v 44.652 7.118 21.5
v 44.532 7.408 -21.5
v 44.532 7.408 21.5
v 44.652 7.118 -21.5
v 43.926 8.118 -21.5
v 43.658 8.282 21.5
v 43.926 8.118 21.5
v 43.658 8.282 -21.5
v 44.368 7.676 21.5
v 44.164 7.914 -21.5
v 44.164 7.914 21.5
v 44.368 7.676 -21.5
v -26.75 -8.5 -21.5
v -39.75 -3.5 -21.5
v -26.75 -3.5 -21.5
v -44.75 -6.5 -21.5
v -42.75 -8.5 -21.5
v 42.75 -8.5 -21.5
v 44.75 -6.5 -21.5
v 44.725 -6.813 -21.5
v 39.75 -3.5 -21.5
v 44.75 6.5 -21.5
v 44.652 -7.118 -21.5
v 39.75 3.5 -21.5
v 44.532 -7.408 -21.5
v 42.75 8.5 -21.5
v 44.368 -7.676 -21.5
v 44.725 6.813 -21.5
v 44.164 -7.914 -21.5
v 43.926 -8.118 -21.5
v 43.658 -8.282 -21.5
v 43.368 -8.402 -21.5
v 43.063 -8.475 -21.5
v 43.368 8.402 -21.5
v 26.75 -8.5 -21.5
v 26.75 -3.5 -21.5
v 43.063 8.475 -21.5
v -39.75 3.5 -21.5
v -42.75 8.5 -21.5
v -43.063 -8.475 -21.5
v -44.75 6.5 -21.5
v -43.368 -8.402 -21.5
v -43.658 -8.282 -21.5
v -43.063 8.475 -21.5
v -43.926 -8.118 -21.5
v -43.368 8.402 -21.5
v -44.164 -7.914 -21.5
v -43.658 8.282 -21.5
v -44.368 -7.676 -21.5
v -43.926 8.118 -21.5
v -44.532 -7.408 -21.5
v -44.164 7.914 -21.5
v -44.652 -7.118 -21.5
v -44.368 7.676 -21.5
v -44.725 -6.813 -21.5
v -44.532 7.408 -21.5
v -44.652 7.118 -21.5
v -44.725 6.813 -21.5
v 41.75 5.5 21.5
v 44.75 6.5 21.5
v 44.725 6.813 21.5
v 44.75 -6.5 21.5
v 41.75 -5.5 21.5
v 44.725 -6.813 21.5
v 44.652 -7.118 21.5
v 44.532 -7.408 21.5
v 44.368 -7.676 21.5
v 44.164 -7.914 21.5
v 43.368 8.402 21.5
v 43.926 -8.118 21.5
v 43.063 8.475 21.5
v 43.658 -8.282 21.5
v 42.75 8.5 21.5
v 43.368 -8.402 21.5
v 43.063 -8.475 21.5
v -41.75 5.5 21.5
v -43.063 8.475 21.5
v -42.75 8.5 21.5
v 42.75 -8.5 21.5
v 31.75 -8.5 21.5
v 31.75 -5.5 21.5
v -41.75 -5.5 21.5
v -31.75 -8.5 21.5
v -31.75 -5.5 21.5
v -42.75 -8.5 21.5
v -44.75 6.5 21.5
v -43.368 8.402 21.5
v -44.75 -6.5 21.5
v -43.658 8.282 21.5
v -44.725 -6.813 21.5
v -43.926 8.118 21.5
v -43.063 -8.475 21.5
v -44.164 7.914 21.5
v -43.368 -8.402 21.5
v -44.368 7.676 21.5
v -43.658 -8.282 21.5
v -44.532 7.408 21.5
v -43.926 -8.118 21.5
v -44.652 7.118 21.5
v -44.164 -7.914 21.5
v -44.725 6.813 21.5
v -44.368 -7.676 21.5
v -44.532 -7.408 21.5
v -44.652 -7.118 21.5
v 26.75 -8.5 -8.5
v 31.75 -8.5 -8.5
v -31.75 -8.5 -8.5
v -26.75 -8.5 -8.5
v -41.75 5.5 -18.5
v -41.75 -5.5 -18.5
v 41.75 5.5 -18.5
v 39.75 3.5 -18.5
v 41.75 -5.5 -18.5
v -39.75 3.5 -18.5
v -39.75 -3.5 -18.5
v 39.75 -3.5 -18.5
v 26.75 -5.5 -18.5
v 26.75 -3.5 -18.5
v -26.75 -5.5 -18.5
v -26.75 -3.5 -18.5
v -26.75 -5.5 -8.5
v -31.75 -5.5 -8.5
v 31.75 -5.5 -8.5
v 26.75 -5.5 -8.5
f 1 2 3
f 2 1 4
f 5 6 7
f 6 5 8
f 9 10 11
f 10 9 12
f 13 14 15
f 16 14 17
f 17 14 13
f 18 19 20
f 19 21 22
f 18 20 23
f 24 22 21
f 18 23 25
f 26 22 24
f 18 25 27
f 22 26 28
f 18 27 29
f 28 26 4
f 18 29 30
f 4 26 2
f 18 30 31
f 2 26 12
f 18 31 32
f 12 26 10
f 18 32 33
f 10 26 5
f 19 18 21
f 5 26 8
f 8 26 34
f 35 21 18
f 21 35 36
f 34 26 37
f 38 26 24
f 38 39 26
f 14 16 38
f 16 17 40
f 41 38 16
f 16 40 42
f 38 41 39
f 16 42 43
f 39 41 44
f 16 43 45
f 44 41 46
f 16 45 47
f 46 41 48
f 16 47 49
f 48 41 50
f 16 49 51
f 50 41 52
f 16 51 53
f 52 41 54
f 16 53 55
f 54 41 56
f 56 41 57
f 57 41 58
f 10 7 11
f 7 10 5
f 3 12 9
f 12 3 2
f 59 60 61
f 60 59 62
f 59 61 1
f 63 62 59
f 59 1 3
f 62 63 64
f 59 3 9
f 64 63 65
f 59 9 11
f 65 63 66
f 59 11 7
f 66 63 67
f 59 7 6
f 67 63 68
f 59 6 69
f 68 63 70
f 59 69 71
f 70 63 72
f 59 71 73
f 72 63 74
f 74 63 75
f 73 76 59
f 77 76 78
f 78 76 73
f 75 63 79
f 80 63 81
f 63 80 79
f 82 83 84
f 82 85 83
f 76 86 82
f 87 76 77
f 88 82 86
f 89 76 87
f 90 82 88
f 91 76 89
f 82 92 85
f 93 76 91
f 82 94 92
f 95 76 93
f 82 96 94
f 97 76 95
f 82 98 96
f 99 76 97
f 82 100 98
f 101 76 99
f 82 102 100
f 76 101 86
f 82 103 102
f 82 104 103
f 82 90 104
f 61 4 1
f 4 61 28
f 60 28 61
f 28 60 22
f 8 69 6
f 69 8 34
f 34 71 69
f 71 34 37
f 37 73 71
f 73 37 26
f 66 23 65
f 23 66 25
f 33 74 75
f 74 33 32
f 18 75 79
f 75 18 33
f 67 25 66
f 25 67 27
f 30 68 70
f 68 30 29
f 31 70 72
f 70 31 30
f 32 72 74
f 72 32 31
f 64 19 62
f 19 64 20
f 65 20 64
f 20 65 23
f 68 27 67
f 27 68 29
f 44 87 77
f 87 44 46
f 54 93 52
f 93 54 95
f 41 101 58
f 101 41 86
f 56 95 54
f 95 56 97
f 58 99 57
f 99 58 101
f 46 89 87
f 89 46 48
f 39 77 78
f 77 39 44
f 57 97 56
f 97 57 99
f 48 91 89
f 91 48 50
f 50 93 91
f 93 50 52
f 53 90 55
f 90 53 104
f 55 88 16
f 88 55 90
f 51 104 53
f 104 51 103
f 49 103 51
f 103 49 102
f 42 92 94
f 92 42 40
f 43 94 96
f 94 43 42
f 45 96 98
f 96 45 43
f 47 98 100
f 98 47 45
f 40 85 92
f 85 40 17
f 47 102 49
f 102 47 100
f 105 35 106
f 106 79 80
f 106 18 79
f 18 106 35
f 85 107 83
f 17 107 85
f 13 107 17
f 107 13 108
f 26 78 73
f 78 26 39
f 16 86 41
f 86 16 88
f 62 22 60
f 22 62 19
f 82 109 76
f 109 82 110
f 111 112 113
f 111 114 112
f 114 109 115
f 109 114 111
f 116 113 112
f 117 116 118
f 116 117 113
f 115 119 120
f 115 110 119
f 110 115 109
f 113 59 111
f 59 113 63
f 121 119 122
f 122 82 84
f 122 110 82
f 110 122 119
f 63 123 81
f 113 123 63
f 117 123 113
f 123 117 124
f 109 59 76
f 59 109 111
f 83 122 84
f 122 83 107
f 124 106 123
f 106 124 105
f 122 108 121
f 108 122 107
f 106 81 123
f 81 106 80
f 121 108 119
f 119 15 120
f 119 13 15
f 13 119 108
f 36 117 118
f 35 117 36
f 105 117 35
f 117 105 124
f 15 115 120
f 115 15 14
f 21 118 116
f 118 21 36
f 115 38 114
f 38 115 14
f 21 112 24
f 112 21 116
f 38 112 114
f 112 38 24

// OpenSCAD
echo(version=version());
/* 
Customizable Phone Holder
Created by: Zeakfury
Created date: 01/16/2017
*/

// Include Boxes library to get easy rounded boxes
include <MCAD/boxes.scad>  

//Viewer
rotate([0,0,180])
render()
Item_Holder();

//Setup Variables

/* [Item Dimensions] */
//- Item's Width (X-Axis)
pWidth = 83.5;

//- Item's Thickness (Y-Axis)
pThick = 11;

//- Mount/Holder Height (Z-Axis)
HHolder = 40;

//- Thickness of the walls for the Mount
WallThick = 3;// 

/* [Supports] */
//- Height of Horizontal Front Lip
HLip = 10;// 

//- Width of Vertical Front Lip
WLip = 20;// 

//- Front Hole on Lip (0=No 1=Yes)
FHole = 1;// [1:Yes,0:No]

//- Front Hole Lip Length
FWidth = 5;// 

/* [Bottom Hole] */
//- Bottom Hole for charger/speakers (0=No 1=Yes)
BHole = 1;// [1:Yes,0:No]

//- Width for Rim of Hole to Hold Item
BWidth = 2;

//- Thick for Rim of Hole to Hold Item
BThick = 2;




//Create Body
module Item_Holder() {
    //rotate([pTilt*-1,0,0]){
        difference(){
            //Main Shape
            union(){
                roundedBox([pWidth+WallThick*2,pThick+WallThick*2,HHolder+WallThick], 2, true, $fn=40);
                
            }
            //Remove Parts
            union(){
                //Phone Hole
                translate([0,0,WallThick]) 
                    color("green")
                cube([pWidth,pThick,HHolder+WallThick], true);
                //Lip Height
                translate([-(pWidth-WLip)/2,pThick/2,WallThick/2-(HHolder/2-HLip)]) 
                    color("blue")
                cube([pWidth-WLip,WallThick,HHolder-HLip], false);
                //Lip Hole
                if (FHole == 1 && BHole == 1 && BThick <= pThick){
                    translate([-(pWidth-FWidth*2-WLip)/2,(pThick/2-BThick),-(HHolder+WallThick)/2]) 
                        color("pink")
                    cube([pWidth-(FWidth*2)-WLip,WallThick+(BThick),HLip+WallThick],false);
                    }else if (FHole == 1 && (BHole == 0 || BThick > pThick)){
                    translate([-(pWidth-FWidth*2-WLip)/2,(pThick/2),-(HHolder+WallThick)/2]) 
                        color("pink")
                    cube([pWidth-(FWidth*2)-WLip,WallThick,HLip+WallThick],false);}                    
                //Bottom Hole
                if (BHole == 1 && BWidth < pWidth && BThick < pThick) {
                    translate([-(pWidth-(BWidth*2))/2,-(pThick-(BThick*2))/2,-(HHolder+WallThick)/2]) 
                        color("red")
                    cube([pWidth-(BWidth*2),pThick-(BThick*2),WallThick],false);}

            }  
         }
             
        //}
}
